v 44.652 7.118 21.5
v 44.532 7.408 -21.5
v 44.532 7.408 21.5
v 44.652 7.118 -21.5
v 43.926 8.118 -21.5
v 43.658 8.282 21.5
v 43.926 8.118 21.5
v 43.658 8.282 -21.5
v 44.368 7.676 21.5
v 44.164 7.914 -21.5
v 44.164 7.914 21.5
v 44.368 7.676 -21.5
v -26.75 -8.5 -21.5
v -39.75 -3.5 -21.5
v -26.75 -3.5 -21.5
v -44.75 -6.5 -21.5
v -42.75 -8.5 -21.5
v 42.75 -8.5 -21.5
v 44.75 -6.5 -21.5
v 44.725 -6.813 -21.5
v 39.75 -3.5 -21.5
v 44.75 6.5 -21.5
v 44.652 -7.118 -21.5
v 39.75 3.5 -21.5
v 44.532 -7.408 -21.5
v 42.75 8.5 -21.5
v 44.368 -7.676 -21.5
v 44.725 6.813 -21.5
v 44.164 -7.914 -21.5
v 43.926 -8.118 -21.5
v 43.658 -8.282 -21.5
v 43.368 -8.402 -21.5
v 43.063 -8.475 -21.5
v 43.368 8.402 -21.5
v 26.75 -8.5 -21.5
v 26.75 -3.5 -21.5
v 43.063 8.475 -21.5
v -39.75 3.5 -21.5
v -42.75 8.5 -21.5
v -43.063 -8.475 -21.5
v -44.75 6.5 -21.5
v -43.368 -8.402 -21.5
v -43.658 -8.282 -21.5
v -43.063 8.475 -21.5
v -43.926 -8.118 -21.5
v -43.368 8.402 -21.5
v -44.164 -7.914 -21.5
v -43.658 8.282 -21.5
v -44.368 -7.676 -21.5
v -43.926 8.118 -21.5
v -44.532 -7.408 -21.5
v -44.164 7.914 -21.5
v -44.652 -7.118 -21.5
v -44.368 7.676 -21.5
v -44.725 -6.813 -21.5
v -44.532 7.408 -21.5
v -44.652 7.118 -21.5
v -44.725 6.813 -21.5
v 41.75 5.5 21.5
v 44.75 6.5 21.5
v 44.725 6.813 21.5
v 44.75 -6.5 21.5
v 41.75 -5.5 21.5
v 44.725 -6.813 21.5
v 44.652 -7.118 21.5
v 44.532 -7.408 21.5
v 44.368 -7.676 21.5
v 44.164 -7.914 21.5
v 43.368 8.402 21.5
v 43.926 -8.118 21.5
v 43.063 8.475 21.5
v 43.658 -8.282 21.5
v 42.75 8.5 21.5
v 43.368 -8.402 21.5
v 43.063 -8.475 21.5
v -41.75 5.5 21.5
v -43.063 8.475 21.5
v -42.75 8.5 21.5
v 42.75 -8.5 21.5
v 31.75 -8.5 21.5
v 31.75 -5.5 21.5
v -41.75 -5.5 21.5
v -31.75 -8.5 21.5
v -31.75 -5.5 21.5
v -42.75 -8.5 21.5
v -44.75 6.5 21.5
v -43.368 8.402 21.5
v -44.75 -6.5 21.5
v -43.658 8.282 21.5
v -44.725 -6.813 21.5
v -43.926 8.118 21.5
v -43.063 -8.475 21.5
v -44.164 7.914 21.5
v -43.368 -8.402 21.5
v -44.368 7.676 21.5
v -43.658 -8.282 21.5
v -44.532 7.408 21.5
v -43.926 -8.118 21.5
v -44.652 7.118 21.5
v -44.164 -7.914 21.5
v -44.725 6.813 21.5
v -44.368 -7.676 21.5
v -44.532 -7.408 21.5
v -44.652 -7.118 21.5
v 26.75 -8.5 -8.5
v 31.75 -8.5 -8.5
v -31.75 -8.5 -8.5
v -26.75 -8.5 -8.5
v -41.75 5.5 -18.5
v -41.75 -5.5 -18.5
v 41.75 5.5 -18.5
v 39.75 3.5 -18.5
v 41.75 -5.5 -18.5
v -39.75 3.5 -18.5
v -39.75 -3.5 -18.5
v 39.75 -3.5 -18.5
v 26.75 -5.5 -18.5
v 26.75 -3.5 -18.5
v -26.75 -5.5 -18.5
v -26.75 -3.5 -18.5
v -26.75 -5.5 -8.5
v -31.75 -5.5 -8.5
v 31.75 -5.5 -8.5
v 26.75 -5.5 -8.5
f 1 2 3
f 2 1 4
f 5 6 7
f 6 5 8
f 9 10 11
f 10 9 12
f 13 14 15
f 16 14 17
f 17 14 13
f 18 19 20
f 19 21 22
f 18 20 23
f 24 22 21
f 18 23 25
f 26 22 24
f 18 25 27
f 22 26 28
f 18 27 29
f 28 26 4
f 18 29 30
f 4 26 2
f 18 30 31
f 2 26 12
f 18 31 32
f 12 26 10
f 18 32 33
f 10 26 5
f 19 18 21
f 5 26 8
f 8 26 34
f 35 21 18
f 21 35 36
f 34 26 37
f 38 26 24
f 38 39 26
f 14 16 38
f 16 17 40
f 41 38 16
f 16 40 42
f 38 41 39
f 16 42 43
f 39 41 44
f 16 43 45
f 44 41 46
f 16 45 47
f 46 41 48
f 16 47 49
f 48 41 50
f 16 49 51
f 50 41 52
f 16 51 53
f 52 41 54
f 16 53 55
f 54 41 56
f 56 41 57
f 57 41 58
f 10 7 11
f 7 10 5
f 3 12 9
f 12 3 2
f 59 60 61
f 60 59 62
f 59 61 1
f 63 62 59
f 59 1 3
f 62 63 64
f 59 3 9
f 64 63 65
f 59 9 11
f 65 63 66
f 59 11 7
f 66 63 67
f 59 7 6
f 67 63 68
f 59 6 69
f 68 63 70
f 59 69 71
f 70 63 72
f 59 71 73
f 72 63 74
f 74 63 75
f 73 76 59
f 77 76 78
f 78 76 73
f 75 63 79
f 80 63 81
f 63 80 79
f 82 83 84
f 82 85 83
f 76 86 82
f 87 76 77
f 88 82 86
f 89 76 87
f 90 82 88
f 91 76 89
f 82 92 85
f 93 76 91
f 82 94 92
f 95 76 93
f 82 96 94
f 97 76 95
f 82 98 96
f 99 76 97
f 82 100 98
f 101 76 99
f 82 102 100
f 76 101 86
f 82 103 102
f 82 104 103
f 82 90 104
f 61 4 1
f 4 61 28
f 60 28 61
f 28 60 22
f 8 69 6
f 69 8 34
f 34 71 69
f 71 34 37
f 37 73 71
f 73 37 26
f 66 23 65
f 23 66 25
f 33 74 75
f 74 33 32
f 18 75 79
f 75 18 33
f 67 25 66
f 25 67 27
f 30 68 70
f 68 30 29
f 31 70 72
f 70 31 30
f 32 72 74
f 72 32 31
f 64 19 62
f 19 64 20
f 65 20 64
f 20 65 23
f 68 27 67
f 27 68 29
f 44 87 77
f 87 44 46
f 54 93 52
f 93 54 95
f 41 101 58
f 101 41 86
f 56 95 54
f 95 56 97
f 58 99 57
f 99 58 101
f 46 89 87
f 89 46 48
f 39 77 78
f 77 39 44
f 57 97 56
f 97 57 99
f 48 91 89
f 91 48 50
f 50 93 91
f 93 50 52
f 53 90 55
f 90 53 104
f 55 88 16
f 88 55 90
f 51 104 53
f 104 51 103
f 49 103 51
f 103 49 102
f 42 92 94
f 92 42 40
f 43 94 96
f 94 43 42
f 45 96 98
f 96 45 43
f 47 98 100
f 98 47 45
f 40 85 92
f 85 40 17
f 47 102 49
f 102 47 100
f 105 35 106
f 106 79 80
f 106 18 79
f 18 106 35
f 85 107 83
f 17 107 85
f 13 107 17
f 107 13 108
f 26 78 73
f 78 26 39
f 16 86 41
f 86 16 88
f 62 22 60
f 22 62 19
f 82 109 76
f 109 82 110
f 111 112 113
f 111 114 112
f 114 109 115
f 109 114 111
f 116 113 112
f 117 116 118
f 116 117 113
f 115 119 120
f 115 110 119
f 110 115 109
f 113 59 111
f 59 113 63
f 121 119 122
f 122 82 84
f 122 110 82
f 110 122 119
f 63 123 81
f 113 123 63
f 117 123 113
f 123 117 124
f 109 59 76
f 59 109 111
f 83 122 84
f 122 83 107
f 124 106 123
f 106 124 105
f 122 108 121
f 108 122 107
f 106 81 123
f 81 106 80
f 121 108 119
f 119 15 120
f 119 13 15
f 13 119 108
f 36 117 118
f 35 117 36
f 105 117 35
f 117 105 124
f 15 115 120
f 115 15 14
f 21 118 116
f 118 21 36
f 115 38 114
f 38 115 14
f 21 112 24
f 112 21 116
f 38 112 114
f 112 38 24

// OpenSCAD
echo(version=version());
/* 
Customizable Phone Holder
Created by: Zeakfury
Created date: 01/16/2017
*/

// Include Boxes library to get easy rounded boxes
include <MCAD/boxes.scad>  

//Viewer
rotate([0,0,180])
render()
Item_Holder();

//Setup Variables

/* [Item Dimensions] */
//- Item's Width (X-Axis)
pWidth = 83.5;

//- Item's Thickness (Y-Axis)
pThick = 11;

//- Mount/Holder Height (Z-Axis)
HHolder = 40;

//- Thickness of the walls for the Mount
WallThick = 3;// 

/* [Supports] */
//- Height of Horizontal Front Lip
HLip = 10;// 

//- Width of Vertical Front Lip
WLip = 20;// 

//- Front Hole on Lip (0=No 1=Yes)
FHole = 1;// [1:Yes,0:No]

//- Front Hole Lip Length
FWidth = 5;// 

/* [Bottom Hole] */
//- Bottom Hole for charger/speakers (0=No 1=Yes)
BHole = 1;// [1:Yes,0:No]

//- Width for Rim of Hole to Hold Item
BWidth = 2;

//- Thick for Rim of Hole to Hold Item
BThick = 2;




//Create Body
module Item_Holder() {
    //rotate([pTilt*-1,0,0]){
        difference(){
            //Main Shape
            union(){
                roundedBox([pWidth+WallThick*2,pThick+WallThick*2,HHolder+WallThick], 2, true, $fn=40);
                
            }
            //Remove Parts
            union(){
                //Phone Hole
                translate([0,0,WallThick]) 
                    color("green")
                cube([pWidth,pThick,HHolder+WallThick], true);
                //Lip Height
                translate([-(pWidth-WLip)/2,pThick/2,WallThick/2-(HHolder/2-HLip)]) 
                    color("blue")
                cube([pWidth-WLip,WallThick,HHolder-HLip], false);
                //Lip Hole
                if (FHole == 1 && BHole == 1 && BThick <= pThick){
                    translate([-(pWidth-FWidth*2-WLip)/2,(pThick/2-BThick),-(HHolder+WallThick)/2]) 
                        color("pink")
                    cube([pWidth-(FWidth*2)-WLip,WallThick+(BThick),HLip+WallThick],false);
                    }else if (FHole == 1 && (BHole == 0 || BThick > pThick)){
                    translate([-(pWidth-FWidth*2-WLip)/2,(pThick/2),-(HHolder+WallThick)/2]) 
                        color("pink")
                    cube([pWidth-(FWidth*2)-WLip,WallThick,HLip+WallThick],false);}                    
                //Bottom Hole
                if (BHole == 1 && BWidth < pWidth && BThick < pThick) {
                    translate([-(pWidth-(BWidth*2))/2,-(pThick-(BThick*2))/2,-(HHolder+WallThick)/2]) 
                        color("red")
                    cube([pWidth-(BWidth*2),pThick-(BThick*2),WallThick],false);}

            }  
         }
             
        //}
}
